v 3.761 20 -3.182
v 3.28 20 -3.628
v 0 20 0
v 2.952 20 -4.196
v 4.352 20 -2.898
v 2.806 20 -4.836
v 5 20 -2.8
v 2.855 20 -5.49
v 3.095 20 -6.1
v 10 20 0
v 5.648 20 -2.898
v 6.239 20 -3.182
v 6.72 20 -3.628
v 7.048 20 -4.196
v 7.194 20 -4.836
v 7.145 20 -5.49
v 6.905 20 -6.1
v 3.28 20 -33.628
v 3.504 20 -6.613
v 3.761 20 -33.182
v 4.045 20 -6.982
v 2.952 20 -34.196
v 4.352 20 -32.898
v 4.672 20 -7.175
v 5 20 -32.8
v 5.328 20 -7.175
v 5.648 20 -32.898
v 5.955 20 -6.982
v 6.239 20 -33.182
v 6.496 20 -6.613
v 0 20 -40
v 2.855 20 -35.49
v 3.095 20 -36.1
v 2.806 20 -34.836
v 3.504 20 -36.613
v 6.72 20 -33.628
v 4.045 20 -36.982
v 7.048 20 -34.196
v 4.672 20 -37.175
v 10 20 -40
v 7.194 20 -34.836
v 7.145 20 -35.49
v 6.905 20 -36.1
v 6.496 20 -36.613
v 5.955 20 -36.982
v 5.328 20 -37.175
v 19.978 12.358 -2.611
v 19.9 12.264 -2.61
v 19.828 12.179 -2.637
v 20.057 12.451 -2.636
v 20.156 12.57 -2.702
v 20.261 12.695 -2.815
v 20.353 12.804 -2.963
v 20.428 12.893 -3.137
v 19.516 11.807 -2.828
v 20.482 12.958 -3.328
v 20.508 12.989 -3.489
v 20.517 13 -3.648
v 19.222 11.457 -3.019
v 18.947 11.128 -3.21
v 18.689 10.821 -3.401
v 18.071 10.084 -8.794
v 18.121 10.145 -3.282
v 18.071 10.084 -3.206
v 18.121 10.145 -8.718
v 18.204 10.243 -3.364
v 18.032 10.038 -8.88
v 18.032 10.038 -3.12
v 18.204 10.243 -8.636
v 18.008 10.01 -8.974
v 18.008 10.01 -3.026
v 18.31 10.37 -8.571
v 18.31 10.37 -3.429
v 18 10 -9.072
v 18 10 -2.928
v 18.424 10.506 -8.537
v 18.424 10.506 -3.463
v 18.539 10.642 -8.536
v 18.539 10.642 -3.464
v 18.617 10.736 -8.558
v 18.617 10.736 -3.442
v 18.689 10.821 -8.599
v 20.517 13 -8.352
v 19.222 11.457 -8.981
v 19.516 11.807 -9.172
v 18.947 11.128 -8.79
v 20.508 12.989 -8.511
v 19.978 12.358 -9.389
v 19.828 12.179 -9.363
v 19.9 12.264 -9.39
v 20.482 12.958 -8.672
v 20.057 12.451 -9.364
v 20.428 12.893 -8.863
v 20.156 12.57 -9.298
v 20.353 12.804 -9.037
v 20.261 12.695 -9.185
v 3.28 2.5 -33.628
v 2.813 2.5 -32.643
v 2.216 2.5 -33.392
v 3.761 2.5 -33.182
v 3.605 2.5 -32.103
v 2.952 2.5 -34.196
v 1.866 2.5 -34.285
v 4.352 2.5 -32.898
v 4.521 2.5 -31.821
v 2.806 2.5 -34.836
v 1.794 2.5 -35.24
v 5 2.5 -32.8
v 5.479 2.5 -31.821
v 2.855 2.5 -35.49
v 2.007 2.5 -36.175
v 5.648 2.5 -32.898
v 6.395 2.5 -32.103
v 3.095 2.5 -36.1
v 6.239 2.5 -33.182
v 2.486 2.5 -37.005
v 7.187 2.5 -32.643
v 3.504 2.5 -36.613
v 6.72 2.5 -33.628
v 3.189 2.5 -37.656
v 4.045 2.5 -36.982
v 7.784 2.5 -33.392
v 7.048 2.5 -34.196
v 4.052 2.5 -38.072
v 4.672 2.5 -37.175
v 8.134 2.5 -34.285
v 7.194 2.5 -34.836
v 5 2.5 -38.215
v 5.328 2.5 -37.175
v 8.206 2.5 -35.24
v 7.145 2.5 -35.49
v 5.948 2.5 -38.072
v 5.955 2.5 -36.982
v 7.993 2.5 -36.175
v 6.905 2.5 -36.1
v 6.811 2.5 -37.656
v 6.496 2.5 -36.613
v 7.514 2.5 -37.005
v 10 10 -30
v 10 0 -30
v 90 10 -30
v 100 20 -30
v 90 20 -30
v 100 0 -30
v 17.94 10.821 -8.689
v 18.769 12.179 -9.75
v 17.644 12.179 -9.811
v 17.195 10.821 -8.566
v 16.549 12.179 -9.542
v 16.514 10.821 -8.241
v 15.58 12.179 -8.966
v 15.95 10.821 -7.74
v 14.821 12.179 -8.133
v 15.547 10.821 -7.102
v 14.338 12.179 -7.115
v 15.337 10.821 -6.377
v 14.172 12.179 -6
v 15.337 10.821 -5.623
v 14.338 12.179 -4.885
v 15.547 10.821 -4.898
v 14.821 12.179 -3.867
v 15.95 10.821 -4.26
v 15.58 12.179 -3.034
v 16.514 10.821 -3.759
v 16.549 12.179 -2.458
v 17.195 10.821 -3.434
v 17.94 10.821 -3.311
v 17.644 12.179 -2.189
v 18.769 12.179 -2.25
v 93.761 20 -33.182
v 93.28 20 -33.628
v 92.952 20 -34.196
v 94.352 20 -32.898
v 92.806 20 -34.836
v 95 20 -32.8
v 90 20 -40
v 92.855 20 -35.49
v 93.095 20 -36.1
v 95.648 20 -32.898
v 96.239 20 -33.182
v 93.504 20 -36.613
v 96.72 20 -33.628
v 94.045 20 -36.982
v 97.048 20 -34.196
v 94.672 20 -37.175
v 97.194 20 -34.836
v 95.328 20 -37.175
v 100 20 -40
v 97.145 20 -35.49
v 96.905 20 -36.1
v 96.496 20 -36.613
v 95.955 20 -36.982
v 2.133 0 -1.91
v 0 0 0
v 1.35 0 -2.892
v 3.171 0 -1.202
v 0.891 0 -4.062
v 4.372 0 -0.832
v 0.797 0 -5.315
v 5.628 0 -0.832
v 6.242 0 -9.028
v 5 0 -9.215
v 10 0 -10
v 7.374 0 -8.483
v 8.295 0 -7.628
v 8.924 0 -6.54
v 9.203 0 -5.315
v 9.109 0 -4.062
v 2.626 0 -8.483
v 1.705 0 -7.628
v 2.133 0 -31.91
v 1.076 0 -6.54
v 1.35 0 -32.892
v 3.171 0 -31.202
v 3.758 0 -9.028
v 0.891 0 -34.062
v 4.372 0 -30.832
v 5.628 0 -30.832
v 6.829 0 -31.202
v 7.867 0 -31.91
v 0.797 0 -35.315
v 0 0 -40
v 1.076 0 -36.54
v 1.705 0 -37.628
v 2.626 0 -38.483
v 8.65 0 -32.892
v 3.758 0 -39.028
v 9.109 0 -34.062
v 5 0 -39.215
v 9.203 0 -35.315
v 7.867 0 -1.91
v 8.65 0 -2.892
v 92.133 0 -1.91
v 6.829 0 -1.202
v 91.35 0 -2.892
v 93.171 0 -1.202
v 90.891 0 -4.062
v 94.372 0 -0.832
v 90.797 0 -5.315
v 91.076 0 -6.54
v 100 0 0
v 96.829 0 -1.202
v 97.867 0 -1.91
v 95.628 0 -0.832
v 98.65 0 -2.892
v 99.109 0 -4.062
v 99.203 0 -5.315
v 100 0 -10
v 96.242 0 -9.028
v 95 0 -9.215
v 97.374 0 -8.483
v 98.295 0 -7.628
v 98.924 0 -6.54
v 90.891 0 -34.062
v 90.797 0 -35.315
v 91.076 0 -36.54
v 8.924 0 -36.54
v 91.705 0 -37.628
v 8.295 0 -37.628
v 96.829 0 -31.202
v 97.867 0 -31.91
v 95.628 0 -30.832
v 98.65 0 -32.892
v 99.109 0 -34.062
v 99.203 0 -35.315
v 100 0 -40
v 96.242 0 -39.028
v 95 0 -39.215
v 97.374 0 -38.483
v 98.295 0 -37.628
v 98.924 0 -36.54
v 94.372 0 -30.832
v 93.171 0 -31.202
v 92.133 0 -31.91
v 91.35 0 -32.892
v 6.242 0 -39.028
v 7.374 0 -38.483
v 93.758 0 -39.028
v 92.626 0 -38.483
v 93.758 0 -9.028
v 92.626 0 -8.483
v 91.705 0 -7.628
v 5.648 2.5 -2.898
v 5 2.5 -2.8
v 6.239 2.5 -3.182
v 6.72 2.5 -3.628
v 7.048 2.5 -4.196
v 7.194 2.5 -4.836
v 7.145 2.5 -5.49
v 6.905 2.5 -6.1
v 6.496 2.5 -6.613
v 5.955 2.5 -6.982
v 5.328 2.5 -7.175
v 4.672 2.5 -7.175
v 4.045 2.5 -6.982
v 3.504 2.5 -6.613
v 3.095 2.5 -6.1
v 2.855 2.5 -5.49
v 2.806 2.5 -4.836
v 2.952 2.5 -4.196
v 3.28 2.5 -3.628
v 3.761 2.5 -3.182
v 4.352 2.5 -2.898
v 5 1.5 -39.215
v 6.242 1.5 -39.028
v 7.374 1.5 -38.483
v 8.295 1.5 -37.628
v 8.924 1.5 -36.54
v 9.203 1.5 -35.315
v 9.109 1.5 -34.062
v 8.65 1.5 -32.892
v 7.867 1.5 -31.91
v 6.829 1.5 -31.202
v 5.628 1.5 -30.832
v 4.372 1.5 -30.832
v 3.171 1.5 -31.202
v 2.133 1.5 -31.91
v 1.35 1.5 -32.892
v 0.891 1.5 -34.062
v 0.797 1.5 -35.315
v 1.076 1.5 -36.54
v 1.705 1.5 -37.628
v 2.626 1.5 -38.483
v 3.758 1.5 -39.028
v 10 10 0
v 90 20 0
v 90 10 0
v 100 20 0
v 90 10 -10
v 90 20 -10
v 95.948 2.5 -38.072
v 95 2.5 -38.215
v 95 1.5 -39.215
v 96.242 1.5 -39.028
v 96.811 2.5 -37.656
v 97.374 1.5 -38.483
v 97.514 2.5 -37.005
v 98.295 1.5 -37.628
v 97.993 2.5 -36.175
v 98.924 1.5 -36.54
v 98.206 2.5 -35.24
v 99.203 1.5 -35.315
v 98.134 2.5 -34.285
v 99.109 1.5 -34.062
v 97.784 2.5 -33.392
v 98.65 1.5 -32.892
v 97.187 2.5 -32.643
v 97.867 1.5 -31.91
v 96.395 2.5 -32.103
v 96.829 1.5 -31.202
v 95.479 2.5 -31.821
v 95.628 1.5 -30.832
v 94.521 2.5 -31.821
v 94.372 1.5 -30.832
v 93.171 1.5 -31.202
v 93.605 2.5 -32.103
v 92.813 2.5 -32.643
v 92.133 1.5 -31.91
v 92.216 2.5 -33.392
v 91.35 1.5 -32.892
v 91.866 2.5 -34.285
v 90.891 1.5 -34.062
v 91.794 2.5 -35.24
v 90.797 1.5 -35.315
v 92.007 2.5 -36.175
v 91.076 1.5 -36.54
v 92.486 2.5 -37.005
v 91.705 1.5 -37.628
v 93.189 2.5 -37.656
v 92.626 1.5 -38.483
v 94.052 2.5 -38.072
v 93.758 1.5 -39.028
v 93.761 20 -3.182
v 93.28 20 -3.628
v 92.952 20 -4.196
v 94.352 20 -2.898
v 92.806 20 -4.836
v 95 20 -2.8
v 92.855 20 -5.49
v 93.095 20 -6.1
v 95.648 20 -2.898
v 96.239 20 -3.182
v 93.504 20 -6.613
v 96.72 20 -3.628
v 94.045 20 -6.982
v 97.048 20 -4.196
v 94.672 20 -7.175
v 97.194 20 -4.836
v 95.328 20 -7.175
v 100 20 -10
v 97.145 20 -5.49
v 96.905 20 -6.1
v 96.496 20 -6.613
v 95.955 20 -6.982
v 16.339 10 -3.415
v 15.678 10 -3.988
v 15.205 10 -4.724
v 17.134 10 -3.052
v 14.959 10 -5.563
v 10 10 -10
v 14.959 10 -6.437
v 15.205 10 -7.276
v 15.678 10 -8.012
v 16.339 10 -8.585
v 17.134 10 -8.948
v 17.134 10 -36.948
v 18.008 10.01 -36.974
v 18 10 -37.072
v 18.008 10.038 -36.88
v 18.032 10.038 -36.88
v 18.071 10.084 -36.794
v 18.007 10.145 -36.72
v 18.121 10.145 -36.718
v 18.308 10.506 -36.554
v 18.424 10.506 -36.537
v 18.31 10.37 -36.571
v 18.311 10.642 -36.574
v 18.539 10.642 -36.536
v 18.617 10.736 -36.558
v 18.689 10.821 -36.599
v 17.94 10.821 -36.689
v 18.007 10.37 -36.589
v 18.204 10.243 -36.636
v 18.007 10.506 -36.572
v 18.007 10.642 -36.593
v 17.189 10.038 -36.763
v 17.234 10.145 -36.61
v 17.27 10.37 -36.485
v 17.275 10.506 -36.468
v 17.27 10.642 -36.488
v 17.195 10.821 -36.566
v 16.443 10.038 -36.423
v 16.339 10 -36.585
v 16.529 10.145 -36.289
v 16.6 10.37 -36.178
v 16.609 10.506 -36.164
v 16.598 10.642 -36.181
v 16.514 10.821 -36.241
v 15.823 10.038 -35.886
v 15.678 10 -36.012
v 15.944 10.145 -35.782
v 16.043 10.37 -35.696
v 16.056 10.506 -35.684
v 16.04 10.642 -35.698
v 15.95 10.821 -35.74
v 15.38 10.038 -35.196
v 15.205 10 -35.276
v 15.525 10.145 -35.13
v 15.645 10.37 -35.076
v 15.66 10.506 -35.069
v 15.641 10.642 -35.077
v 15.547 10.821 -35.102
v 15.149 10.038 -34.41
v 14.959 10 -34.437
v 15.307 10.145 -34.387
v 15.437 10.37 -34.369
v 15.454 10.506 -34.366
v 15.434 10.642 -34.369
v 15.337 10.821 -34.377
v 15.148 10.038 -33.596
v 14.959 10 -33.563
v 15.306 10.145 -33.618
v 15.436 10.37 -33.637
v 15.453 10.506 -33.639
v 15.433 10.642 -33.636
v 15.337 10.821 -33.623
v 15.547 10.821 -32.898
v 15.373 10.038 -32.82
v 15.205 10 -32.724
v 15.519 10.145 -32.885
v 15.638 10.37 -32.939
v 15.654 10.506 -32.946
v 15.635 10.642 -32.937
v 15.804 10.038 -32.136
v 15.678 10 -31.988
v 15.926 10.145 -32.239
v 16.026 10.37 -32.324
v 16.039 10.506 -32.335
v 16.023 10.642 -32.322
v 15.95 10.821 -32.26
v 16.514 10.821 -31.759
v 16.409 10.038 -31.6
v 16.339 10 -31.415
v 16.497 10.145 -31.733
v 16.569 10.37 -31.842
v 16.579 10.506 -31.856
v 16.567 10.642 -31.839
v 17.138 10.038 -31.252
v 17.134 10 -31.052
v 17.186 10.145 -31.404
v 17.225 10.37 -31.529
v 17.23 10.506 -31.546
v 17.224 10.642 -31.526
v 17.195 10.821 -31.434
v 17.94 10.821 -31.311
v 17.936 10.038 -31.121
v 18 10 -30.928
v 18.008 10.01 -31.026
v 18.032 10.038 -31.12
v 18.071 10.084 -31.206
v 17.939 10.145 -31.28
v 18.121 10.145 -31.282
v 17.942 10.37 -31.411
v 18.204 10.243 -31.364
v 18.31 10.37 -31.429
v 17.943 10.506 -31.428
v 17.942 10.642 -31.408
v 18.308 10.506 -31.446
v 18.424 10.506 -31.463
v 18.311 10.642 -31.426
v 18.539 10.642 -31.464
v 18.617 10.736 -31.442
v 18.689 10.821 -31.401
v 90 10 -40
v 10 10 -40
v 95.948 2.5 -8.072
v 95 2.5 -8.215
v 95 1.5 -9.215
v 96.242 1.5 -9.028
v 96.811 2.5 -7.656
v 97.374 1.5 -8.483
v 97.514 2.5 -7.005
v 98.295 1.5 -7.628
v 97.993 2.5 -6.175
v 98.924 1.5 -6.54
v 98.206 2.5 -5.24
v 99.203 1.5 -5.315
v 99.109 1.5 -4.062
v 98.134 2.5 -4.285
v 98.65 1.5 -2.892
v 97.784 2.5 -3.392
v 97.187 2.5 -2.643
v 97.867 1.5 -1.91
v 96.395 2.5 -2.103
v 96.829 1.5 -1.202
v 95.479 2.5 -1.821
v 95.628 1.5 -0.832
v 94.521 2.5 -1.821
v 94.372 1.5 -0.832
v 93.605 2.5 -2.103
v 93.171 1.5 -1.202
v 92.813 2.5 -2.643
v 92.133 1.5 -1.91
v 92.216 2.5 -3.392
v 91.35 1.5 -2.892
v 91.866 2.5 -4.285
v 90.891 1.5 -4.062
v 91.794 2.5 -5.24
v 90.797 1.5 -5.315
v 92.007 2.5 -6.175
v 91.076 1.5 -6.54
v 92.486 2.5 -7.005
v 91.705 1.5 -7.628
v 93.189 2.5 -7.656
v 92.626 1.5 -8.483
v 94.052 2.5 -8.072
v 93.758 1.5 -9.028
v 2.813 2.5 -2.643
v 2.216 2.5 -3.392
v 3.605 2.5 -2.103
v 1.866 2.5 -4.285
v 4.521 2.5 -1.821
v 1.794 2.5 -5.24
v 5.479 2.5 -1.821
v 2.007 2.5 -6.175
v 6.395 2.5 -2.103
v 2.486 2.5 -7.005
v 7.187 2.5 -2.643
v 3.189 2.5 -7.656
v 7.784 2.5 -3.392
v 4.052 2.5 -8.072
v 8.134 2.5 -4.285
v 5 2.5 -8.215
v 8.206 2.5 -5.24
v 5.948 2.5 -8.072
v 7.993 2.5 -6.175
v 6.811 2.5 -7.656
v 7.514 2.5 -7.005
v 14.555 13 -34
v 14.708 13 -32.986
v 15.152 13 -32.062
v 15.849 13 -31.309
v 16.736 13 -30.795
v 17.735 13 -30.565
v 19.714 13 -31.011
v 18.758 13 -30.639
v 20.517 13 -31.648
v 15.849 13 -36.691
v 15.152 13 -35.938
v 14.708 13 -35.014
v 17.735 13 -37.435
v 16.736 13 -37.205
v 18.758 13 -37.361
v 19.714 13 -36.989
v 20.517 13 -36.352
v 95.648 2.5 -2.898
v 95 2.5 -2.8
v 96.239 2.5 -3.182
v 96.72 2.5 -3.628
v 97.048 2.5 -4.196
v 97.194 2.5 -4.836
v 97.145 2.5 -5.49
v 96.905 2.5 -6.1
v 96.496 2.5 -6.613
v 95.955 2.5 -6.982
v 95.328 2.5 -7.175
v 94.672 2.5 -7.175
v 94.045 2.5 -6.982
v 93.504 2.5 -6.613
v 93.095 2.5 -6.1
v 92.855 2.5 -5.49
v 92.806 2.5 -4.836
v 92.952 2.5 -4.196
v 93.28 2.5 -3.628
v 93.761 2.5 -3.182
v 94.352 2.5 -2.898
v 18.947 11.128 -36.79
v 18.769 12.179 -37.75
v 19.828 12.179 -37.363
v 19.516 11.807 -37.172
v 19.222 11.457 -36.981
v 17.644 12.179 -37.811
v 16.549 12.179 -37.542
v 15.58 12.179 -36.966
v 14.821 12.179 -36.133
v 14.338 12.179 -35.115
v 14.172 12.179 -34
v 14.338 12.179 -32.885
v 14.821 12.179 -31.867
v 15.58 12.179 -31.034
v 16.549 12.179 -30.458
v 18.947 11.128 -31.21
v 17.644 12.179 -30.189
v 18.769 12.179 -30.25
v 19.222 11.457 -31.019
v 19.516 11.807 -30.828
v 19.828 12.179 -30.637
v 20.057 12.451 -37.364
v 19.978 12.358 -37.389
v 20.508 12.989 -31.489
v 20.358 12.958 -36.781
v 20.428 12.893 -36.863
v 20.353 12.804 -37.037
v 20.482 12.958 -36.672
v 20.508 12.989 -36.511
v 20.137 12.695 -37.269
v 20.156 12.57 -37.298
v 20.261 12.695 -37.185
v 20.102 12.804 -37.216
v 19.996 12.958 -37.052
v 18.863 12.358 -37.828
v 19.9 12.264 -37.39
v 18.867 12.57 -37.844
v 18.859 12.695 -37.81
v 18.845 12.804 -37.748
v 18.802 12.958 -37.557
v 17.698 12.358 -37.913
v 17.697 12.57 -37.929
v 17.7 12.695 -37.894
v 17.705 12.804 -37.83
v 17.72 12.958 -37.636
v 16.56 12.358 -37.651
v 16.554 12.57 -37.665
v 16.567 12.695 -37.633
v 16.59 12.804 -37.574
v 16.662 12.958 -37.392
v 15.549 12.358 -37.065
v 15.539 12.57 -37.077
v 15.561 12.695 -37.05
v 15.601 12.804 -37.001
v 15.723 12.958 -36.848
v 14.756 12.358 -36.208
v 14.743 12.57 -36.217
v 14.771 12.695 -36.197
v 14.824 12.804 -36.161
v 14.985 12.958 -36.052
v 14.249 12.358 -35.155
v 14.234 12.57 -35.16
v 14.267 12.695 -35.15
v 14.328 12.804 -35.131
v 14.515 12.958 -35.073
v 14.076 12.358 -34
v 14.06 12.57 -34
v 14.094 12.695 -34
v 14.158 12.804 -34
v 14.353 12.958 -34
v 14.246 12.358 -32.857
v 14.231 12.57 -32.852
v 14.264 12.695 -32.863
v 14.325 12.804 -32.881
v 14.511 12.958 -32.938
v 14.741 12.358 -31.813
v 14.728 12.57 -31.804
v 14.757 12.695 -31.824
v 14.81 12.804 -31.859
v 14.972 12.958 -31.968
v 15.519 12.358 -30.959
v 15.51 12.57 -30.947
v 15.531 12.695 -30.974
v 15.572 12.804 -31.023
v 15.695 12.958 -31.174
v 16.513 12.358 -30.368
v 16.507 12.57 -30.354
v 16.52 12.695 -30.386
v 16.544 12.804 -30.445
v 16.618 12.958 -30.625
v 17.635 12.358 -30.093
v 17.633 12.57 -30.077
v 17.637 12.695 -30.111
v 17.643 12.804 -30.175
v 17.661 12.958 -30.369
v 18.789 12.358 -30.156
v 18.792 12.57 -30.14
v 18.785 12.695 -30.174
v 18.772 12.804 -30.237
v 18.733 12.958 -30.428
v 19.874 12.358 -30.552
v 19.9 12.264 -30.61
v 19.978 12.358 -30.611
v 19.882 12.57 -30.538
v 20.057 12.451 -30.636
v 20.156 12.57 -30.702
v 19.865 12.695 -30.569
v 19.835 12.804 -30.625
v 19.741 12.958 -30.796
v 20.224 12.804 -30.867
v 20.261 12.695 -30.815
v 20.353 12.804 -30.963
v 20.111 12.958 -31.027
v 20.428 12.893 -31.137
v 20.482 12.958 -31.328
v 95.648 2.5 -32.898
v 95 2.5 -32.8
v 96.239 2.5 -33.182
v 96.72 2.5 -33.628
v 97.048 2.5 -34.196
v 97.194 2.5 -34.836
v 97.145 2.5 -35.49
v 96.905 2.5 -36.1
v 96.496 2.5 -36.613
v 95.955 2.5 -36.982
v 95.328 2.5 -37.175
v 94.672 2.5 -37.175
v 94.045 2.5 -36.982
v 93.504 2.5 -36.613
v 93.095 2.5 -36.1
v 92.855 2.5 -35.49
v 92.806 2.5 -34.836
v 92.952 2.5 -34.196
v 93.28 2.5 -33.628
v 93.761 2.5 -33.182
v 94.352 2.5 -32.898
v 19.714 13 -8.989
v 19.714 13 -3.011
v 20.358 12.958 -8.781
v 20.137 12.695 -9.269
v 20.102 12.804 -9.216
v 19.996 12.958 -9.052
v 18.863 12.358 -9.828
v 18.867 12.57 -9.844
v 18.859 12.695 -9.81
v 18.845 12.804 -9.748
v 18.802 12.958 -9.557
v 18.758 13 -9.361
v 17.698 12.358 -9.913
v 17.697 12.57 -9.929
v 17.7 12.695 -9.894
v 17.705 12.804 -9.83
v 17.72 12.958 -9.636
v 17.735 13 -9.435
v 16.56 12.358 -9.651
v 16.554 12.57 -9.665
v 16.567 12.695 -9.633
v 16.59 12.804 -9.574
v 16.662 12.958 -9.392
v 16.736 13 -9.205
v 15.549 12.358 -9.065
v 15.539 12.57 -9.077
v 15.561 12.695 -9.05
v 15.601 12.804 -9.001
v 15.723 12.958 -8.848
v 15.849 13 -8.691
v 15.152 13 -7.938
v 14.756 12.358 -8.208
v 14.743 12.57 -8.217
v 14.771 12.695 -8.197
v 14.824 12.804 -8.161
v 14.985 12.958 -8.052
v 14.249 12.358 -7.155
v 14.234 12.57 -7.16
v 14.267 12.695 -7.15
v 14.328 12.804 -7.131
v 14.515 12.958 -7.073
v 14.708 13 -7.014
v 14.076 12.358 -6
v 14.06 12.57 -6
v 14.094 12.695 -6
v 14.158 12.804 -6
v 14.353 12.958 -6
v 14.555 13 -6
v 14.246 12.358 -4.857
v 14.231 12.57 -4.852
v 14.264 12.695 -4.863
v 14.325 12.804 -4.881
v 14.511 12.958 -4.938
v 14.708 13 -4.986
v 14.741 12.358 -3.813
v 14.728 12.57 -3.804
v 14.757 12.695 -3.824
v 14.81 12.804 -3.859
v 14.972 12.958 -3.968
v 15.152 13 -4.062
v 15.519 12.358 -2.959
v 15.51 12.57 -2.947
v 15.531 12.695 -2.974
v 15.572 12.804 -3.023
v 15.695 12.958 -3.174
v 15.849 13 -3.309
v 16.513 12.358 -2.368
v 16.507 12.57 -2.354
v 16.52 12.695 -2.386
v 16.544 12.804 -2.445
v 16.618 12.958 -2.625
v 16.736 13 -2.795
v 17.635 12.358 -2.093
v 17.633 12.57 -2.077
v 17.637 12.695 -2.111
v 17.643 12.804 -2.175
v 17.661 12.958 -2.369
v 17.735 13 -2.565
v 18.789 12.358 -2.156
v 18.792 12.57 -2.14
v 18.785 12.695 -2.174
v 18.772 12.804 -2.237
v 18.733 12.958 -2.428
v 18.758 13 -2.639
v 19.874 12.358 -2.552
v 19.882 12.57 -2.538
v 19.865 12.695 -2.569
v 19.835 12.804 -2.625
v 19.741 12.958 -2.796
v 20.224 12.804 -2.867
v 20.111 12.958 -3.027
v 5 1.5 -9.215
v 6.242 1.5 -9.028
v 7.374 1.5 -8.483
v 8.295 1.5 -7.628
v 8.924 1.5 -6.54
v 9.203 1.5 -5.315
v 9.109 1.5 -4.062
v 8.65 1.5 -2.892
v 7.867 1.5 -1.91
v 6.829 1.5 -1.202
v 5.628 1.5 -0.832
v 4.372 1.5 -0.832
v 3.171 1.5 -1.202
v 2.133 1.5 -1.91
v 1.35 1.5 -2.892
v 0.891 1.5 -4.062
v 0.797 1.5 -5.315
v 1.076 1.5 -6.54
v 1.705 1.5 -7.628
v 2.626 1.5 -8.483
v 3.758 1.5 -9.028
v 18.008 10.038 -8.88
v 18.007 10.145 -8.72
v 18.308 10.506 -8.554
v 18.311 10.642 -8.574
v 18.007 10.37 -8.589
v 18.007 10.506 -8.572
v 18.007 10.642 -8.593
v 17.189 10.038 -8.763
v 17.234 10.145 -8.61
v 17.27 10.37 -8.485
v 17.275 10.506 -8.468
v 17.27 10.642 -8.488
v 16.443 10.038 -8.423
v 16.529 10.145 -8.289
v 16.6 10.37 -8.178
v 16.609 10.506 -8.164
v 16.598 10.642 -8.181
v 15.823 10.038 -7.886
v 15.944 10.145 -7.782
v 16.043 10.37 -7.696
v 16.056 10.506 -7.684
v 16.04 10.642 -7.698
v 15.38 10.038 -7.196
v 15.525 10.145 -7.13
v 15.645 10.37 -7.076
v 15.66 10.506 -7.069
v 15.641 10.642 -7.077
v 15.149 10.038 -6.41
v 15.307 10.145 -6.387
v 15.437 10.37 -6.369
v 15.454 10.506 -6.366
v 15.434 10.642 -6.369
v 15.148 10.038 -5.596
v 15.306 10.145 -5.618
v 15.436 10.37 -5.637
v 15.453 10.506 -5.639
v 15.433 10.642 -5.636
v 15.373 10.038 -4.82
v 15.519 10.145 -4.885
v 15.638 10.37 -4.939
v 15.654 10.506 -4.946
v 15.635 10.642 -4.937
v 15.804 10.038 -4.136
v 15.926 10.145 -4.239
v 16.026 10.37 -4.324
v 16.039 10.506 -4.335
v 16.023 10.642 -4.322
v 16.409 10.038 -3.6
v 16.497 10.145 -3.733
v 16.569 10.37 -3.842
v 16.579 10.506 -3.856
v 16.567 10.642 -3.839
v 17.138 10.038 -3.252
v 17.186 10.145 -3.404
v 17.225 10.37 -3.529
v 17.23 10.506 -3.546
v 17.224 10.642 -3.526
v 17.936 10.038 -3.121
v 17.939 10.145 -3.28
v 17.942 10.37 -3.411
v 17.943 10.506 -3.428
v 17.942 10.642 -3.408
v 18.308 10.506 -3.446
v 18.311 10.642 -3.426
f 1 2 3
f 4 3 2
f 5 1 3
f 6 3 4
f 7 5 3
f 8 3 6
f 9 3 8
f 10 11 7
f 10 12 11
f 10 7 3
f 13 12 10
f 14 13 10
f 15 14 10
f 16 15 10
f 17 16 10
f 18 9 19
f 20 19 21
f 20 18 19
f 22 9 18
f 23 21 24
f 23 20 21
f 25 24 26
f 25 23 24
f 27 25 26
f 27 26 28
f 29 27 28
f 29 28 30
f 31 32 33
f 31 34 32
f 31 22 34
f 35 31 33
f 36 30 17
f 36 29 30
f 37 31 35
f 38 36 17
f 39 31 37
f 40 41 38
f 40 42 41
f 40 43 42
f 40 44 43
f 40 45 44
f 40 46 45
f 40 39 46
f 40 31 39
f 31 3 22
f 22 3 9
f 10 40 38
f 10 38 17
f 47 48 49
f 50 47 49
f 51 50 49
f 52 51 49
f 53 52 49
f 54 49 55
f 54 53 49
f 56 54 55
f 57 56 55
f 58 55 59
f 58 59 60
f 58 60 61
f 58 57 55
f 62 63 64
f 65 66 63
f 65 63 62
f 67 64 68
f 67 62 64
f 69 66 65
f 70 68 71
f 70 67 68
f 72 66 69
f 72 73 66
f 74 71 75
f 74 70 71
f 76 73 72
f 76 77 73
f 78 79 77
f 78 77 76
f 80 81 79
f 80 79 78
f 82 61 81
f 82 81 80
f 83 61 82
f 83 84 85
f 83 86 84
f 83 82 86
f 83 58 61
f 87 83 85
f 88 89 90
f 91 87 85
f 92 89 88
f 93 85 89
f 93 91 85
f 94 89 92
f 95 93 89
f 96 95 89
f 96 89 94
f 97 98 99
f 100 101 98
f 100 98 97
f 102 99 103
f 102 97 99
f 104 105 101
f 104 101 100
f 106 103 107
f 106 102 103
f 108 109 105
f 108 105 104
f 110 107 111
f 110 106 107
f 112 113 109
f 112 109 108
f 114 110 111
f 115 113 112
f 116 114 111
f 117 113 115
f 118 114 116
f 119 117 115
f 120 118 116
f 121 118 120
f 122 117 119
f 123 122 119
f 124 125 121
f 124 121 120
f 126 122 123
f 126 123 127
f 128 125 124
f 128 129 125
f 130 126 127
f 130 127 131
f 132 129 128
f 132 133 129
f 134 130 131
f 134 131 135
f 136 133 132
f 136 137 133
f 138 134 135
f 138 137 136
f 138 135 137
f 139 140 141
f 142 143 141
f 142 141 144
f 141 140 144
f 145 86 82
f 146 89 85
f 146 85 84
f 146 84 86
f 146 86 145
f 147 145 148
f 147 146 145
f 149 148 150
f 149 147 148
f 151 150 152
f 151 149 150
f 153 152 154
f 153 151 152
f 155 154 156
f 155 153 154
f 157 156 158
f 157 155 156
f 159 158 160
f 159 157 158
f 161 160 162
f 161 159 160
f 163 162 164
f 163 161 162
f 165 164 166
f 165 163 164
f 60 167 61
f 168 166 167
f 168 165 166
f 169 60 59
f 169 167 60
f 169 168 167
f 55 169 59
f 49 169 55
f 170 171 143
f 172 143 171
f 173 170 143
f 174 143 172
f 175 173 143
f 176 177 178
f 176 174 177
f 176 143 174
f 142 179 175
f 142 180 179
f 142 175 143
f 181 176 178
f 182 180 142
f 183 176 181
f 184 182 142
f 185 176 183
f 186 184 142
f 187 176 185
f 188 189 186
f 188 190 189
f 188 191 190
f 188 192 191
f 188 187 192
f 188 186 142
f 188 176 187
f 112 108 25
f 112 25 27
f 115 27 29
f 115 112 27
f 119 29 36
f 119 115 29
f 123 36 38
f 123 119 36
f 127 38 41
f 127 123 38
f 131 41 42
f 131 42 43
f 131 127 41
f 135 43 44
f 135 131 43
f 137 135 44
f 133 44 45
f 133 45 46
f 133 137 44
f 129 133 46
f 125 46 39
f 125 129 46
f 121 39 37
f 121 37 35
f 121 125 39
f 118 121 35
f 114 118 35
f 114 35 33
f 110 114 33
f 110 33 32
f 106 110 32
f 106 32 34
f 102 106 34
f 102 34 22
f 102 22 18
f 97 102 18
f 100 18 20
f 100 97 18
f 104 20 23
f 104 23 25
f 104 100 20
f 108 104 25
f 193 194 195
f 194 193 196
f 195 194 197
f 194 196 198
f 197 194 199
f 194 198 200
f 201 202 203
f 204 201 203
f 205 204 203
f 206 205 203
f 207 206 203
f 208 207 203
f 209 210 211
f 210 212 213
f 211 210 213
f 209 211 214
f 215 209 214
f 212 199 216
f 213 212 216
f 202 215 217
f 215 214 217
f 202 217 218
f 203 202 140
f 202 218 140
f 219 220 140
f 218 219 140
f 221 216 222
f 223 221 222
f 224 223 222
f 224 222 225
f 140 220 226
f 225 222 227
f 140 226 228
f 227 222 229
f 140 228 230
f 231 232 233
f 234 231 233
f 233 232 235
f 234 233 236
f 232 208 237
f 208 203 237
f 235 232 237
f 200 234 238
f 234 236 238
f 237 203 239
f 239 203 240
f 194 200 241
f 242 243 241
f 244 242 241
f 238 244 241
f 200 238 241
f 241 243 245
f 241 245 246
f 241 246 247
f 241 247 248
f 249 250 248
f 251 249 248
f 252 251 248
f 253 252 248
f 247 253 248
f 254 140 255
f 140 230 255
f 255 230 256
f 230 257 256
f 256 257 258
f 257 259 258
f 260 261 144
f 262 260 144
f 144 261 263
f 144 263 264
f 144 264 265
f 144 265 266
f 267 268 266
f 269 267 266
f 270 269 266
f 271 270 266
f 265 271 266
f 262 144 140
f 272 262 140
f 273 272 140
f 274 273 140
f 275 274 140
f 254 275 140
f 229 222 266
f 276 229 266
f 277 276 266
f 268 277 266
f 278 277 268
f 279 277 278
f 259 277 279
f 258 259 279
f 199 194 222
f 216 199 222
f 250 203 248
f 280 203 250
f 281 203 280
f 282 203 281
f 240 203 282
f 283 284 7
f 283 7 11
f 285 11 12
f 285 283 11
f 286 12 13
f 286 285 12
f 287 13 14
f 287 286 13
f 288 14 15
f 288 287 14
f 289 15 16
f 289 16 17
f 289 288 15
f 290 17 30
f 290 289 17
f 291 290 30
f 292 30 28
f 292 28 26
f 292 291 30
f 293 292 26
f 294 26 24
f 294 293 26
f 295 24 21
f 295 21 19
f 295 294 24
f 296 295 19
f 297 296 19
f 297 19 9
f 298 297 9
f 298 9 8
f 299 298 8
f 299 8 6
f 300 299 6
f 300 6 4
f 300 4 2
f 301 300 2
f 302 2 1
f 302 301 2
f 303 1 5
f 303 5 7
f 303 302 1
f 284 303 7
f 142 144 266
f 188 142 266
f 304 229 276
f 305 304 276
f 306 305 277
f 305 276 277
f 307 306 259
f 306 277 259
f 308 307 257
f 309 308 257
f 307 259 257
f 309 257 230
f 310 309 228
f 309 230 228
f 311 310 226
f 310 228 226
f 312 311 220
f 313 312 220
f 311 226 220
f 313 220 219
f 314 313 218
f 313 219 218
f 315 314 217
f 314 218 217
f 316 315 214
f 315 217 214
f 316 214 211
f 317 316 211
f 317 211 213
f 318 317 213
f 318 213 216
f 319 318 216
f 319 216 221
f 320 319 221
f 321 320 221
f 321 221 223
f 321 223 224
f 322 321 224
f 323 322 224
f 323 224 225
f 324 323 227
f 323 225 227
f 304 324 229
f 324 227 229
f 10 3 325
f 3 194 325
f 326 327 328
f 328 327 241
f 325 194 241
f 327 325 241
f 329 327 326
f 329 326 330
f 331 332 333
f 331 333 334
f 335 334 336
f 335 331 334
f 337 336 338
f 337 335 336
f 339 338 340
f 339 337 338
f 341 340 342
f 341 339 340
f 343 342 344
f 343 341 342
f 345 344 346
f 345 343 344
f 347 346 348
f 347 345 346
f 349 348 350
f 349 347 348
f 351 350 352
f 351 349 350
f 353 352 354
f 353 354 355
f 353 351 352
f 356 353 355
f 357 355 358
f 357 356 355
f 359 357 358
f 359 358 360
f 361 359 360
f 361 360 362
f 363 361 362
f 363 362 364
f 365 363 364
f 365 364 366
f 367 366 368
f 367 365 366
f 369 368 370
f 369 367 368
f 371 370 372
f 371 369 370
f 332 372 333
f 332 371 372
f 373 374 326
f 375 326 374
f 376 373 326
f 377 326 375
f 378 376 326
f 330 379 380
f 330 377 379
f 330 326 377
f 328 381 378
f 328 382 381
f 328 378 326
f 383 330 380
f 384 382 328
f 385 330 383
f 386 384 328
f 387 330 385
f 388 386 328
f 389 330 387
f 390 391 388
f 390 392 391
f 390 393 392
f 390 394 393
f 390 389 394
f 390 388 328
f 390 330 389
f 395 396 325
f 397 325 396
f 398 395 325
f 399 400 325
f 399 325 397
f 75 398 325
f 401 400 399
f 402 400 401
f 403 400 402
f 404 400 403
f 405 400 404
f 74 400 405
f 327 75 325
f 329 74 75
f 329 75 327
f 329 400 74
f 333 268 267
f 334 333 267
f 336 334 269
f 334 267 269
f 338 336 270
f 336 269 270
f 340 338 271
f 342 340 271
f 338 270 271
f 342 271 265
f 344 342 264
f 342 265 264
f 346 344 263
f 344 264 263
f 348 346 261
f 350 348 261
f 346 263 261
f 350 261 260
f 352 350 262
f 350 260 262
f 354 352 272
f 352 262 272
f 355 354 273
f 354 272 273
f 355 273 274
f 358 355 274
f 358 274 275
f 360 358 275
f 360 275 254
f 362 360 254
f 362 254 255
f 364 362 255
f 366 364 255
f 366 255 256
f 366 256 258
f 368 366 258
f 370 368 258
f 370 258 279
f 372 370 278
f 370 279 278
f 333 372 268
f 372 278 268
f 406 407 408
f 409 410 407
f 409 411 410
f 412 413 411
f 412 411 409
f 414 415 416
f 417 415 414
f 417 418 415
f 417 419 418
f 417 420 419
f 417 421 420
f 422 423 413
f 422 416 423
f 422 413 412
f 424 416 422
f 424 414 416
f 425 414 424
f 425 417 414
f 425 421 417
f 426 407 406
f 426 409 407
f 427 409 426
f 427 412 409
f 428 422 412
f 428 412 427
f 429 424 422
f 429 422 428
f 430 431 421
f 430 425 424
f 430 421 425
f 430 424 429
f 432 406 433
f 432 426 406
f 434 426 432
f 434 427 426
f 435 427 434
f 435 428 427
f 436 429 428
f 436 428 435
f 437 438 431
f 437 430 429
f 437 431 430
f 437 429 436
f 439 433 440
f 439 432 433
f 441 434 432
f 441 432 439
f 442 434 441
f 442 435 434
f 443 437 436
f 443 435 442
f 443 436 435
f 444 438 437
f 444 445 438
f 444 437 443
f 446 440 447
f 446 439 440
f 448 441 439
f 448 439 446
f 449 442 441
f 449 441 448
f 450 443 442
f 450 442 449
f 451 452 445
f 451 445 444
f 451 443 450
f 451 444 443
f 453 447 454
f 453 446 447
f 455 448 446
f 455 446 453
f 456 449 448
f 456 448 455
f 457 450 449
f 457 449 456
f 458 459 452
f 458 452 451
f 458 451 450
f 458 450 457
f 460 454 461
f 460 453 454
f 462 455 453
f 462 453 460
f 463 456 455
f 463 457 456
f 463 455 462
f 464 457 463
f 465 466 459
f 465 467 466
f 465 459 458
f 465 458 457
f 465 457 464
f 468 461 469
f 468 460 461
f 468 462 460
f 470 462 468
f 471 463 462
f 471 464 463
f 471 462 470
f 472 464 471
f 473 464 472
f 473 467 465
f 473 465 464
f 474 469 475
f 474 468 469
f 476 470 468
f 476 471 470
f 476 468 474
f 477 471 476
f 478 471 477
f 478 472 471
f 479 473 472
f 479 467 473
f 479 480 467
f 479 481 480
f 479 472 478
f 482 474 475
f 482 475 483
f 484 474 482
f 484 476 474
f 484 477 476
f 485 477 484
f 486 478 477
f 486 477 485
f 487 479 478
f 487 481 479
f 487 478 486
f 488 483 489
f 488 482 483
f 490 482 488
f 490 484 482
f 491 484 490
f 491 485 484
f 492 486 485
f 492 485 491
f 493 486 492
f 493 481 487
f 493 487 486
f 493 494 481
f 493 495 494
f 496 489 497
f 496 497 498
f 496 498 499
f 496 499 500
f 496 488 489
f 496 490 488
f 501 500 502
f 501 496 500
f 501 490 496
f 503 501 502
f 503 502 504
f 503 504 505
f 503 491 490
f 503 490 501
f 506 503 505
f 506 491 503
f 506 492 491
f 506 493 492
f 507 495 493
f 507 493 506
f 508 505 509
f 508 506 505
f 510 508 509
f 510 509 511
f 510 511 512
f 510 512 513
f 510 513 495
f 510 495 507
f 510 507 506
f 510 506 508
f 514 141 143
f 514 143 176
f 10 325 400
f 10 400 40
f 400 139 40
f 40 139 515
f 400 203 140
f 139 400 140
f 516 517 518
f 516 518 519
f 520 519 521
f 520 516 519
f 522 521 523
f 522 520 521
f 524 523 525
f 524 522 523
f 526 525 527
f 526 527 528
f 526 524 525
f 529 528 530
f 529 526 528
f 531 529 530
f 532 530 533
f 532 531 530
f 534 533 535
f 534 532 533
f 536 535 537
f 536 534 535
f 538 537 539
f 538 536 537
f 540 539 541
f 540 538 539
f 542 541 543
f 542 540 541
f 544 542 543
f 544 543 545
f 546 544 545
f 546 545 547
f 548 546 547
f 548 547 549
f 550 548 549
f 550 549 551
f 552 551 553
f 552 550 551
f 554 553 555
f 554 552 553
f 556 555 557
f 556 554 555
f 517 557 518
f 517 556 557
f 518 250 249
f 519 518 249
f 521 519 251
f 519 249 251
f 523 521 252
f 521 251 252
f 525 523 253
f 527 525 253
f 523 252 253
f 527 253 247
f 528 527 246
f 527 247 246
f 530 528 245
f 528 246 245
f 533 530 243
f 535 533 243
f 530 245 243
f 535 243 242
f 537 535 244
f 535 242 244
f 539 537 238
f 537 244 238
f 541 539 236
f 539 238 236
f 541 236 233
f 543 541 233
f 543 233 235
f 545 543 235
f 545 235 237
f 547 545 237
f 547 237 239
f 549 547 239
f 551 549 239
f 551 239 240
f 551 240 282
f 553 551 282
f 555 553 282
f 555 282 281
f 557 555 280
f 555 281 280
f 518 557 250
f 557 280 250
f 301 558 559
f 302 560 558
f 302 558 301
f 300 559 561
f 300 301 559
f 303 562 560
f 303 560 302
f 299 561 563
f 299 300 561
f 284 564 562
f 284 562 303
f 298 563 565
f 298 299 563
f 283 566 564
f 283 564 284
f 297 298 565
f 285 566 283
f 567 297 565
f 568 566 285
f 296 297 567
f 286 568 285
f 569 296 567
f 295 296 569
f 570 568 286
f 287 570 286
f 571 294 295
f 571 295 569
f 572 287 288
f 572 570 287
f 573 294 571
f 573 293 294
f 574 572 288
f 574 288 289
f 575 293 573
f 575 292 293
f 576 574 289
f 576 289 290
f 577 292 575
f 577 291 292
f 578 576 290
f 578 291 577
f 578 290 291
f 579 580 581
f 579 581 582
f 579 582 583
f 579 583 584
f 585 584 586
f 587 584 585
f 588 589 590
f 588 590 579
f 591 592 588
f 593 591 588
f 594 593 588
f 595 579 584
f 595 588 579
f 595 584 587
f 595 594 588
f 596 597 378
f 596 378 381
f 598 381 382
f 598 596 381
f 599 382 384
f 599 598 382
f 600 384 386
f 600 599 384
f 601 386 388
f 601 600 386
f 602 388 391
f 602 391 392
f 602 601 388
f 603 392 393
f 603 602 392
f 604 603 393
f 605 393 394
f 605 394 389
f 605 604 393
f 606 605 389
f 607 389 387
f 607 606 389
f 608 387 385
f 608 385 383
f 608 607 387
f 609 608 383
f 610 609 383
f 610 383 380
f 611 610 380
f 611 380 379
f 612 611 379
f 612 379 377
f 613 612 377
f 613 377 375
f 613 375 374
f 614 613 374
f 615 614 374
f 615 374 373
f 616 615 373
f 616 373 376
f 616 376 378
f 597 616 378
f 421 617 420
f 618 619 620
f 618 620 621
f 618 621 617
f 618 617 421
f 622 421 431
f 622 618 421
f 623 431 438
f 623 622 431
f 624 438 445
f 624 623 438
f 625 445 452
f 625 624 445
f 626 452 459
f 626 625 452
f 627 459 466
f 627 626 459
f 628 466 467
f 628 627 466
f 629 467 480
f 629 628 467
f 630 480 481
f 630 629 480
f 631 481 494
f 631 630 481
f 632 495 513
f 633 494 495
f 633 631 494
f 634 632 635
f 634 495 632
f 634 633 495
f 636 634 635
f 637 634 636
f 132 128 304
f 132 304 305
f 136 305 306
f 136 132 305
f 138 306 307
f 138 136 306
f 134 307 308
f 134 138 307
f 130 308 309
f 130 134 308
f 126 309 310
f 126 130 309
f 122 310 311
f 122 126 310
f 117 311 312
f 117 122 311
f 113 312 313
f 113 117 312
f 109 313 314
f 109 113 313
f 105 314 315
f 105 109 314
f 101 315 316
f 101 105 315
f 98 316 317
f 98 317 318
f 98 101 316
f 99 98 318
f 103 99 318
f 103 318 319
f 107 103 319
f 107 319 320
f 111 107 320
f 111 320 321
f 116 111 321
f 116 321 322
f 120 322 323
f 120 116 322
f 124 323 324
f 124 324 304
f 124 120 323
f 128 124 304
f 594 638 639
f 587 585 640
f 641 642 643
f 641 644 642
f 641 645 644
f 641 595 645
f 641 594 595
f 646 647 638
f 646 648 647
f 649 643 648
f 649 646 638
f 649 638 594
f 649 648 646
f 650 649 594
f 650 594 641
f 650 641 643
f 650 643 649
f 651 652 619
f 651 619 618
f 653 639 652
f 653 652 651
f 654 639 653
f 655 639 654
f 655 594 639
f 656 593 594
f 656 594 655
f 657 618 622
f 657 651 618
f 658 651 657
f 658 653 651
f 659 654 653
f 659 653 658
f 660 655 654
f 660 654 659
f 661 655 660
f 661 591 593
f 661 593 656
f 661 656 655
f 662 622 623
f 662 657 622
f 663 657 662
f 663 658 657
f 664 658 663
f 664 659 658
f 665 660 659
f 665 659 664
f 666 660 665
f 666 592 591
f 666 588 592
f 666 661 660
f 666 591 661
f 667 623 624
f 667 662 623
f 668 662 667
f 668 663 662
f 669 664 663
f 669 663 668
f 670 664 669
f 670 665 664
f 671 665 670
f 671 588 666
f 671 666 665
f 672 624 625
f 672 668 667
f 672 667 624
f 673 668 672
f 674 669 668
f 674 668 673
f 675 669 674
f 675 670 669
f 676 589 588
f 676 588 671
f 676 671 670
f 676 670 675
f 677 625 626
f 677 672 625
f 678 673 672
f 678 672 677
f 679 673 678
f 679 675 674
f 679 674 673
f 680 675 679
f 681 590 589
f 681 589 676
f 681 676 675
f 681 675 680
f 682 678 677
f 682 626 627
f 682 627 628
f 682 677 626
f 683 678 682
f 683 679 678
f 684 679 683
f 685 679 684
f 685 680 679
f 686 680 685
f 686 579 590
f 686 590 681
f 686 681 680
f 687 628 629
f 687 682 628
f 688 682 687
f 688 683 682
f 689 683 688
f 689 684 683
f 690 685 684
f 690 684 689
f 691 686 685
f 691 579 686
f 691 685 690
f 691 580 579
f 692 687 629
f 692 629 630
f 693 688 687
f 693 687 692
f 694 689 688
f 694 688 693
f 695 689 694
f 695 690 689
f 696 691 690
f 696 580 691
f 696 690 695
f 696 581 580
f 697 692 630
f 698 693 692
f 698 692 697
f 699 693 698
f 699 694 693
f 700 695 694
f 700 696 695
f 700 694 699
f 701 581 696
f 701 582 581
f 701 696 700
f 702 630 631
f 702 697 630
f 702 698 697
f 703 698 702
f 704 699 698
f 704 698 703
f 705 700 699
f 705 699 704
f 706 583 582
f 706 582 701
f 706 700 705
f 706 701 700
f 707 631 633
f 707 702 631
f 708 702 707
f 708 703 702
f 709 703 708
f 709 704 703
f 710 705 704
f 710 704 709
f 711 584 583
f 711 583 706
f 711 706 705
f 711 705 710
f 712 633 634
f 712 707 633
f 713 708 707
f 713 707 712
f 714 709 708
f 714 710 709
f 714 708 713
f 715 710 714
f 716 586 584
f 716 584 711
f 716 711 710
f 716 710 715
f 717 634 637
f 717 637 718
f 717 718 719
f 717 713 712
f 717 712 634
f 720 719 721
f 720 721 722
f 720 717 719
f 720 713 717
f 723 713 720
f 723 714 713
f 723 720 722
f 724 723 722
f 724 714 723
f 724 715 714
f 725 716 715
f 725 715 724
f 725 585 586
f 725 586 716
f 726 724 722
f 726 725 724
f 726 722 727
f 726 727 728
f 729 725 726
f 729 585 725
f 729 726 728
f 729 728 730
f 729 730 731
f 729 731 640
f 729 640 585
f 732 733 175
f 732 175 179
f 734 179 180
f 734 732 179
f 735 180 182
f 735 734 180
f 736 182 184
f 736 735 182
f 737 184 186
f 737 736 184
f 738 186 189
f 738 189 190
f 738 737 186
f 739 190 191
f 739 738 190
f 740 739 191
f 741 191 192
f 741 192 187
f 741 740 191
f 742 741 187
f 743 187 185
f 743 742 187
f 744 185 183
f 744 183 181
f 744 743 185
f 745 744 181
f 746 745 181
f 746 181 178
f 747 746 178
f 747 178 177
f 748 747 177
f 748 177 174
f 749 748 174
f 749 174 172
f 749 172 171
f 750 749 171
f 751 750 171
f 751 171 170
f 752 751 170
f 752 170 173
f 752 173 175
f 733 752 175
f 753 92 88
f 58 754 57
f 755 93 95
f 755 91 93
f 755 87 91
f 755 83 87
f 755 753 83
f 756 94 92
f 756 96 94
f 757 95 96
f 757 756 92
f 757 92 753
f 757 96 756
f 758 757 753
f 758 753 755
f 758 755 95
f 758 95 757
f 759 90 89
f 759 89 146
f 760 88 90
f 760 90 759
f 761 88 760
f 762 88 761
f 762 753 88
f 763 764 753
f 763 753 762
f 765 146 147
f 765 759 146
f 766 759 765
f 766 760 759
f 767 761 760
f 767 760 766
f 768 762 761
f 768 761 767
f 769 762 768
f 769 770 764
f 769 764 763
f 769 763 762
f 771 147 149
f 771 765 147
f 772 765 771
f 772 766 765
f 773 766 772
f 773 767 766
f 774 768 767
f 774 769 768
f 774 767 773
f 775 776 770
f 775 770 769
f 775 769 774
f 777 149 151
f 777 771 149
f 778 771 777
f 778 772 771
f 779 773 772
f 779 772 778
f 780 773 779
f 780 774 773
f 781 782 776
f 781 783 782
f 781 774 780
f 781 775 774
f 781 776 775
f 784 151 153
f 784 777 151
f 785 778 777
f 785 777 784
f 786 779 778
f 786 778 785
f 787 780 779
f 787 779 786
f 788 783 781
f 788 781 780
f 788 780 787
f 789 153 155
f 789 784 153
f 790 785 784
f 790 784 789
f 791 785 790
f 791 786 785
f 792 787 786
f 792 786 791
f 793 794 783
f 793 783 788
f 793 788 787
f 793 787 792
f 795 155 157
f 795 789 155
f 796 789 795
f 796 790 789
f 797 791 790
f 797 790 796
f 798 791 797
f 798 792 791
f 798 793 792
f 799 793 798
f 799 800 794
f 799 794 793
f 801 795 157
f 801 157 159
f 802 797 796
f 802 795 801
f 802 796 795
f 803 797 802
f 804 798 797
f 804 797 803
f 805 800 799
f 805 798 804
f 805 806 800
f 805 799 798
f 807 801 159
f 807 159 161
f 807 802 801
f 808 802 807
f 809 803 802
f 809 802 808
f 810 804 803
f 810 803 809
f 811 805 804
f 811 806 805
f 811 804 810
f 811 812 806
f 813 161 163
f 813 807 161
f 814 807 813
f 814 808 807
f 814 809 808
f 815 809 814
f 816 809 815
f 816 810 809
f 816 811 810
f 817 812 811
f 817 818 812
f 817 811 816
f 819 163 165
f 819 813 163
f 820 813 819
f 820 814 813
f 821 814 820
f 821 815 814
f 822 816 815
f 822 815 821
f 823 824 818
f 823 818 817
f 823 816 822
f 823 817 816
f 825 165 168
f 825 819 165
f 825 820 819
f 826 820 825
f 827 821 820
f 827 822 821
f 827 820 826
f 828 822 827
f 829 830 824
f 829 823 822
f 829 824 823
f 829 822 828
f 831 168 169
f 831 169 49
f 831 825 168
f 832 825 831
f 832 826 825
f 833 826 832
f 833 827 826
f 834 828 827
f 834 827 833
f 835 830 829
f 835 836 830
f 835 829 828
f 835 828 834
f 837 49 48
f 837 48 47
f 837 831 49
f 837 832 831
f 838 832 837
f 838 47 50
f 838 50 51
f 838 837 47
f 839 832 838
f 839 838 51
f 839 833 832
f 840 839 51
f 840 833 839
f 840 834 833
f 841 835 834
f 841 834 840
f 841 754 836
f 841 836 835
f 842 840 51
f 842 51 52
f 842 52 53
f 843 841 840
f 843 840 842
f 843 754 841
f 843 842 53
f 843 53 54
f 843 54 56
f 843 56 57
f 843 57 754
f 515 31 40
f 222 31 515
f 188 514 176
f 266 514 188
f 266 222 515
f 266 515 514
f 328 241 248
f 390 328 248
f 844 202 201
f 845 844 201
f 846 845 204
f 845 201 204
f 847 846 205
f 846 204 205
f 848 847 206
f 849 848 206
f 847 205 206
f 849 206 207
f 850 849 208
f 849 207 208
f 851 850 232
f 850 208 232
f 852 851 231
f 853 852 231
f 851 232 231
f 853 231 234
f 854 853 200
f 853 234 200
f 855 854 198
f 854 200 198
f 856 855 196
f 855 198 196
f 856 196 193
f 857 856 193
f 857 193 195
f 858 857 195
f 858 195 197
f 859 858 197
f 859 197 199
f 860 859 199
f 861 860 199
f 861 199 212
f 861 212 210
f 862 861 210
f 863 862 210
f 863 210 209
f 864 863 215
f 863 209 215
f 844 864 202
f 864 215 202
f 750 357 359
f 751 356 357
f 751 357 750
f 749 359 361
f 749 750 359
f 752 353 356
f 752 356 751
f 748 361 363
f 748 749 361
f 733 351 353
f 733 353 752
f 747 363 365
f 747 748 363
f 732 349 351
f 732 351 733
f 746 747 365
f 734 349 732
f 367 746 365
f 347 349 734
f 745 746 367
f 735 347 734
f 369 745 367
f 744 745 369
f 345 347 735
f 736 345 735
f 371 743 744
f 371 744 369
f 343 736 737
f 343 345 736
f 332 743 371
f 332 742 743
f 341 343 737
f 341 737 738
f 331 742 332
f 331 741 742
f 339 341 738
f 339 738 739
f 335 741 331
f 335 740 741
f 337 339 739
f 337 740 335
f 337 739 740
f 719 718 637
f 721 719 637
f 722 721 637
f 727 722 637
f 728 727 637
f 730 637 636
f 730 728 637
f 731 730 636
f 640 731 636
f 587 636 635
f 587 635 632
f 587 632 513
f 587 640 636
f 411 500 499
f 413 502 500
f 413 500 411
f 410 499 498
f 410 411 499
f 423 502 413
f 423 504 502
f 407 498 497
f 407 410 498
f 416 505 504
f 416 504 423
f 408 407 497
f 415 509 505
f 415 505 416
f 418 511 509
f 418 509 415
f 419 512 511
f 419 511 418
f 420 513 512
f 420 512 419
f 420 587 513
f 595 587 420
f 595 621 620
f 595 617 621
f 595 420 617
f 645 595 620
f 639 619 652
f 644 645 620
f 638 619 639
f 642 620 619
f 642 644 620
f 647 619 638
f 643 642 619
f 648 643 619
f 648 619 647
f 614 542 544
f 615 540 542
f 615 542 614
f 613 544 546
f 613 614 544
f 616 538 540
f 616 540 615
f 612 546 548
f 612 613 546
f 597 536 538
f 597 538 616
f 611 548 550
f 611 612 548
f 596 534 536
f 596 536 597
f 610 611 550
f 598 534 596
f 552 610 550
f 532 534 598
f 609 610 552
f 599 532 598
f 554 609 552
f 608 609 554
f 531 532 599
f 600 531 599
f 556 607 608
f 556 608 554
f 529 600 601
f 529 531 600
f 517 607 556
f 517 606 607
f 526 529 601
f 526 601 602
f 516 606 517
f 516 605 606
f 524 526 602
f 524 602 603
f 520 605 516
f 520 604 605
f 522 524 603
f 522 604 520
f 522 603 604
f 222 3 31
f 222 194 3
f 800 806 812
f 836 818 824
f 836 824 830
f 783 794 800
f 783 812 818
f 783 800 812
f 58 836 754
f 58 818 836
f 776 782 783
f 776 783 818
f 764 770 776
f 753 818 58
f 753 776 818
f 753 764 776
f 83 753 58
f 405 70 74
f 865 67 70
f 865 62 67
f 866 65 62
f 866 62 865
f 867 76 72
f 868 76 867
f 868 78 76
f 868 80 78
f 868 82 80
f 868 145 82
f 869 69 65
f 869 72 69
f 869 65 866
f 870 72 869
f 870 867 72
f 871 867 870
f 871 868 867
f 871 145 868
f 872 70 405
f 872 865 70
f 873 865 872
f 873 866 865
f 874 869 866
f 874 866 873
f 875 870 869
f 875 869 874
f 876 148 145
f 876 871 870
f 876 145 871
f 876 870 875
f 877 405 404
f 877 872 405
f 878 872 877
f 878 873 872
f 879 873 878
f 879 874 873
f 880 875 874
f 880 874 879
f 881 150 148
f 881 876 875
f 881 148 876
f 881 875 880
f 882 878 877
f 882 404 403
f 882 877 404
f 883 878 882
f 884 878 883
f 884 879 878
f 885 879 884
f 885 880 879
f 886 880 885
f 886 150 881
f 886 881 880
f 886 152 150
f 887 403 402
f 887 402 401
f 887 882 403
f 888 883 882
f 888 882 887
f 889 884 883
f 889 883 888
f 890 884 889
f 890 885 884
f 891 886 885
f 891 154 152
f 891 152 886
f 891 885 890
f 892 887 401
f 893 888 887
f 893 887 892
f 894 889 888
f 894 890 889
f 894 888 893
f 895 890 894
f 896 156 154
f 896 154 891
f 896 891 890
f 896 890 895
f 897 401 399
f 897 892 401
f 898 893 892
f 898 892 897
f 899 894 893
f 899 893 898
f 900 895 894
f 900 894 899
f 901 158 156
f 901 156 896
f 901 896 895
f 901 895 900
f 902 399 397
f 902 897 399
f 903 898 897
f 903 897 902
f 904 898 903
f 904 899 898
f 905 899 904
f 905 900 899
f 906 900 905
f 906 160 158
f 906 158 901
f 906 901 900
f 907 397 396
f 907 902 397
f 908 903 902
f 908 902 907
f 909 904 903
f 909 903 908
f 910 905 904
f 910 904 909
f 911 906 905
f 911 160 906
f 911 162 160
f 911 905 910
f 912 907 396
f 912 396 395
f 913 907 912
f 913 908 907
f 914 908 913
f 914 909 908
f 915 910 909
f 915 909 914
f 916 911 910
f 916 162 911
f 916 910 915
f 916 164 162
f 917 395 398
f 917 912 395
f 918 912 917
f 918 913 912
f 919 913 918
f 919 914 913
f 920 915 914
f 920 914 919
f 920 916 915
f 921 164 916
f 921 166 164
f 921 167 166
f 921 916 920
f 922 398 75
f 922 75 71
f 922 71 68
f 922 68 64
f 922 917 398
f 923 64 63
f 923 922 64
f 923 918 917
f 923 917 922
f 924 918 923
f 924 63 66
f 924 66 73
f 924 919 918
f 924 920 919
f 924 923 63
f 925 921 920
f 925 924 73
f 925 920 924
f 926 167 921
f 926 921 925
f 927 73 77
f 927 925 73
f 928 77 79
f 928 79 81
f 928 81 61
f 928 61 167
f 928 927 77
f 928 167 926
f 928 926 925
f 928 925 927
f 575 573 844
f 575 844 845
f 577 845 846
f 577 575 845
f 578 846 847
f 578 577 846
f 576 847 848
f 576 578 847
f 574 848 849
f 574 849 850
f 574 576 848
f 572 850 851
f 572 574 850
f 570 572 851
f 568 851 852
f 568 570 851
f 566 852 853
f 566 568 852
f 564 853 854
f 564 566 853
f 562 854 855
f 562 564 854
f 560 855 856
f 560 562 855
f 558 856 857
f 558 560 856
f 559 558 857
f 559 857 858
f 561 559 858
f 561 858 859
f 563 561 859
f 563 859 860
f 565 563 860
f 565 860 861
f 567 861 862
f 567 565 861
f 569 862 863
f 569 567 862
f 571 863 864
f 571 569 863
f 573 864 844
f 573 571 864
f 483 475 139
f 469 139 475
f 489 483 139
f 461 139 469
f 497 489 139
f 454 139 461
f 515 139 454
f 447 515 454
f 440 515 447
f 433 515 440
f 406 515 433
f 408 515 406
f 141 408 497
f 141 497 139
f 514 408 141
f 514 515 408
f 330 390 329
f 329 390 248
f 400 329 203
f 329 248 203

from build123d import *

# Parameters (mm, degrees)
SKETCH1_R             = 2.2
BOSS_EXTRUDE1_DEPTH   = 10
SKETCH5_W             = 10
SKETCH5_H             = 40
SKETCH5_R             = 2.2
SKETCH5_H_2           = 10
BOSS_EXTRUDE3_DEPTH   = 10
SKETCH6_R             = 4.215
CUT_EXTRUDE1_DEPTH    = 2.5
CHAMFER2_SIZE         = 1
BOSS_EXTRUDE4_DEPTH   = 3
BOSS_EXTRUDE4_DRAFT   = -40
BOSS_EXTRUDE4_2_DEPTH = 3
BOSS_EXTRUDE4_2_DRAFT = -40
FILLET1_R             = 0.5


# Read off the part's stored shape, not the designer's step: Boss-Extrude4
with BuildPart() as part:
    # Sketch1 → Boss-Extrude1 (new body)
    with BuildSketch(Plane(origin=(0, 0, 0), x_dir=(1, 0, 0), z_dir=(0, 1, 0))):
        Polygon((10, 10), (10, 30), (90, 30), (100, 30), (100, 40), (0, 40), (0, 0), (100, 0), (100, 10), (90, 10), align=None)
        with Locations(Location((5, 5, 0), (0, 0, 270))):
            Circle(SKETCH1_R, mode=Mode.SUBTRACT)
        with Locations(Location((95, 5, 0), (0, 0, 270))):
            Circle(SKETCH1_R, mode=Mode.SUBTRACT)
        with Locations(Location((5, 35, 0), (0, 0, 270))):
            Circle(SKETCH1_R, mode=Mode.SUBTRACT)
        with Locations(Location((95, 35, 0), (0, 0, 270))):
            Circle(SKETCH1_R, mode=Mode.SUBTRACT)
    extrude(amount=BOSS_EXTRUDE1_DEPTH)

    # Sketch5 → Boss-Extrude3 (add)
    # profile 1 of 3: a face of its own
    with BuildSketch(Plane(origin=(0, 10, 0), x_dir=(1, 0, 0), z_dir=(0, 1, 0))):
        with Locations((5, 20)):
            Rectangle(SKETCH5_W, SKETCH5_H)
        with Locations(Location((5, 5, 0), (0, 0, 270))):
            Circle(SKETCH5_R, mode=Mode.SUBTRACT)
        with Locations(Location((5, 35, 0), (0, 0, 270))):
            Circle(SKETCH5_R, mode=Mode.SUBTRACT)
    # profile 2 of 3: a face of its own
    with BuildSketch(Plane(origin=(0, 10, 0), x_dir=(1, 0, 0), z_dir=(0, 1, 0))):
        with Locations((95, 5)):
            Rectangle(SKETCH5_W, SKETCH5_H_2)
        with Locations(Location((95, 5, 0), (0, 0, 270))):
            Circle(SKETCH5_R, mode=Mode.SUBTRACT)
    # profile 3 of 3: a face of its own
    with BuildSketch(Plane(origin=(0, 10, 0), x_dir=(1, 0, 0), z_dir=(0, 1, 0))):
        with Locations((95, 35)):
            Rectangle(SKETCH5_W, SKETCH5_H_2)
        with Locations(Location((95, 35, 0), (0, 0, 270))):
            Circle(SKETCH5_R, mode=Mode.SUBTRACT)
    extrude(amount=BOSS_EXTRUDE3_DEPTH)

    # Sketch6 → Cut-Extrude1 (cut)
    with BuildSketch(Plane.XZ):
        with Locations(Location((5, -35, 0), (0, 0, 270))):
            Circle(SKETCH6_R)
        with Locations(Location((5, -5, 0), (0, 0, 270))):
            Circle(SKETCH6_R)
        with Locations(Location((95, -5, 0), (0, 0, 270))):
            Circle(SKETCH6_R)
        with Locations(Location((95, -35, 0), (0, 0, 270))):
            Circle(SKETCH6_R)
    extrude(amount=-CUT_EXTRUDE1_DEPTH, mode=Mode.SUBTRACT)

    # Chamfer2
    chamfer2_edges = [part.edges().sort_by_distance(p)[0] for p in [
        (95, 2.5, -30.785),
        (95, 2.5, -0.785),
        (5, 2.5, -0.785),
        (5, 2.5, -30.785),
    ]]
    chamfer(chamfer2_edges, length=CHAMFER2_SIZE)


with BuildPart() as boss_extrude4_tool:
    # Boss-Extrude4 outline → Boss-Extrude4 (with draft: the straight prism first)
    with BuildSketch(Plane(origin=(0, 13, 0), x_dir=(1, 0, 0), z_dir=(0, 1, 0))):
        with BuildLine():
            ThreePointArc((20.517298894, 9.750892637), (13.482701106, 6), (20.517298894, 2.249107363))
            Line((20.517298894, 2.249107363), (20.517298894, 9.750892637))
        make_face()
    extrude(amount=-BOSS_EXTRUDE4_DEPTH)
    # Boss-Extrude4: the draft: its side faces are tilted about the plane it starts from
    boss_extrude4_sides = [boss_extrude4_tool.faces().sort_by_distance(p)[0] for p in [
        (20.517298894, 11.5, -6),
        (13.482701106, 11.5, -6),
    ]]
    draft(boss_extrude4_sides, Plane(origin=(0, 13, 0), x_dir=(1, 0, 0), z_dir=(0, 1, 0)), BOSS_EXTRUDE4_DRAFT)


with BuildPart() as part_1:
    add(part.part)

    # Boss-Extrude4: add boss_extrude4_tool
    add(boss_extrude4_tool.part)


with BuildPart() as boss_extrude4_2_tool:
    # Boss-Extrude4 2 outline → Boss-Extrude4 2 (with draft: the straight prism first)
    with BuildSketch(Plane(origin=(0, 13, 0), x_dir=(1, 0, 0), z_dir=(0, 1, 0))):
        with BuildLine():
            ThreePointArc((20.517298894, 37.750892637), (13.482701106, 34), (20.517298894, 30.249107363))
            Line((20.517298894, 30.249107363), (20.517298894, 37.750892637))
        make_face()
    extrude(amount=-BOSS_EXTRUDE4_2_DEPTH)
    # Boss-Extrude4 2: the draft: its side faces are tilted about the plane it starts from
    boss_extrude4_2_sides = [boss_extrude4_2_tool.faces().sort_by_distance(p)[0] for p in [
        (13.482701106, 11.5, -34),
        (20.517298894, 11.5, -34),
    ]]
    draft(boss_extrude4_2_sides, Plane(origin=(0, 13, 0), x_dir=(1, 0, 0), z_dir=(0, 1, 0)), BOSS_EXTRUDE4_2_DRAFT)


with BuildPart() as part_2:
    add(part_1.part)

    # Boss-Extrude4 2: add boss_extrude4_2_tool
    add(boss_extrude4_2_tool.part)

    # Fillet1
    fillet1_edges = [part_2.edges().sort_by_distance(p)[0] for p in [
        (13.482701106, 13, -34),
        (16, 10, -34),
        (13.482701106, 13, -6),
        (16, 10, -6),
    ]]
    fillet(fillet1_edges, radius=FILLET1_R)


solid = part_2.part
